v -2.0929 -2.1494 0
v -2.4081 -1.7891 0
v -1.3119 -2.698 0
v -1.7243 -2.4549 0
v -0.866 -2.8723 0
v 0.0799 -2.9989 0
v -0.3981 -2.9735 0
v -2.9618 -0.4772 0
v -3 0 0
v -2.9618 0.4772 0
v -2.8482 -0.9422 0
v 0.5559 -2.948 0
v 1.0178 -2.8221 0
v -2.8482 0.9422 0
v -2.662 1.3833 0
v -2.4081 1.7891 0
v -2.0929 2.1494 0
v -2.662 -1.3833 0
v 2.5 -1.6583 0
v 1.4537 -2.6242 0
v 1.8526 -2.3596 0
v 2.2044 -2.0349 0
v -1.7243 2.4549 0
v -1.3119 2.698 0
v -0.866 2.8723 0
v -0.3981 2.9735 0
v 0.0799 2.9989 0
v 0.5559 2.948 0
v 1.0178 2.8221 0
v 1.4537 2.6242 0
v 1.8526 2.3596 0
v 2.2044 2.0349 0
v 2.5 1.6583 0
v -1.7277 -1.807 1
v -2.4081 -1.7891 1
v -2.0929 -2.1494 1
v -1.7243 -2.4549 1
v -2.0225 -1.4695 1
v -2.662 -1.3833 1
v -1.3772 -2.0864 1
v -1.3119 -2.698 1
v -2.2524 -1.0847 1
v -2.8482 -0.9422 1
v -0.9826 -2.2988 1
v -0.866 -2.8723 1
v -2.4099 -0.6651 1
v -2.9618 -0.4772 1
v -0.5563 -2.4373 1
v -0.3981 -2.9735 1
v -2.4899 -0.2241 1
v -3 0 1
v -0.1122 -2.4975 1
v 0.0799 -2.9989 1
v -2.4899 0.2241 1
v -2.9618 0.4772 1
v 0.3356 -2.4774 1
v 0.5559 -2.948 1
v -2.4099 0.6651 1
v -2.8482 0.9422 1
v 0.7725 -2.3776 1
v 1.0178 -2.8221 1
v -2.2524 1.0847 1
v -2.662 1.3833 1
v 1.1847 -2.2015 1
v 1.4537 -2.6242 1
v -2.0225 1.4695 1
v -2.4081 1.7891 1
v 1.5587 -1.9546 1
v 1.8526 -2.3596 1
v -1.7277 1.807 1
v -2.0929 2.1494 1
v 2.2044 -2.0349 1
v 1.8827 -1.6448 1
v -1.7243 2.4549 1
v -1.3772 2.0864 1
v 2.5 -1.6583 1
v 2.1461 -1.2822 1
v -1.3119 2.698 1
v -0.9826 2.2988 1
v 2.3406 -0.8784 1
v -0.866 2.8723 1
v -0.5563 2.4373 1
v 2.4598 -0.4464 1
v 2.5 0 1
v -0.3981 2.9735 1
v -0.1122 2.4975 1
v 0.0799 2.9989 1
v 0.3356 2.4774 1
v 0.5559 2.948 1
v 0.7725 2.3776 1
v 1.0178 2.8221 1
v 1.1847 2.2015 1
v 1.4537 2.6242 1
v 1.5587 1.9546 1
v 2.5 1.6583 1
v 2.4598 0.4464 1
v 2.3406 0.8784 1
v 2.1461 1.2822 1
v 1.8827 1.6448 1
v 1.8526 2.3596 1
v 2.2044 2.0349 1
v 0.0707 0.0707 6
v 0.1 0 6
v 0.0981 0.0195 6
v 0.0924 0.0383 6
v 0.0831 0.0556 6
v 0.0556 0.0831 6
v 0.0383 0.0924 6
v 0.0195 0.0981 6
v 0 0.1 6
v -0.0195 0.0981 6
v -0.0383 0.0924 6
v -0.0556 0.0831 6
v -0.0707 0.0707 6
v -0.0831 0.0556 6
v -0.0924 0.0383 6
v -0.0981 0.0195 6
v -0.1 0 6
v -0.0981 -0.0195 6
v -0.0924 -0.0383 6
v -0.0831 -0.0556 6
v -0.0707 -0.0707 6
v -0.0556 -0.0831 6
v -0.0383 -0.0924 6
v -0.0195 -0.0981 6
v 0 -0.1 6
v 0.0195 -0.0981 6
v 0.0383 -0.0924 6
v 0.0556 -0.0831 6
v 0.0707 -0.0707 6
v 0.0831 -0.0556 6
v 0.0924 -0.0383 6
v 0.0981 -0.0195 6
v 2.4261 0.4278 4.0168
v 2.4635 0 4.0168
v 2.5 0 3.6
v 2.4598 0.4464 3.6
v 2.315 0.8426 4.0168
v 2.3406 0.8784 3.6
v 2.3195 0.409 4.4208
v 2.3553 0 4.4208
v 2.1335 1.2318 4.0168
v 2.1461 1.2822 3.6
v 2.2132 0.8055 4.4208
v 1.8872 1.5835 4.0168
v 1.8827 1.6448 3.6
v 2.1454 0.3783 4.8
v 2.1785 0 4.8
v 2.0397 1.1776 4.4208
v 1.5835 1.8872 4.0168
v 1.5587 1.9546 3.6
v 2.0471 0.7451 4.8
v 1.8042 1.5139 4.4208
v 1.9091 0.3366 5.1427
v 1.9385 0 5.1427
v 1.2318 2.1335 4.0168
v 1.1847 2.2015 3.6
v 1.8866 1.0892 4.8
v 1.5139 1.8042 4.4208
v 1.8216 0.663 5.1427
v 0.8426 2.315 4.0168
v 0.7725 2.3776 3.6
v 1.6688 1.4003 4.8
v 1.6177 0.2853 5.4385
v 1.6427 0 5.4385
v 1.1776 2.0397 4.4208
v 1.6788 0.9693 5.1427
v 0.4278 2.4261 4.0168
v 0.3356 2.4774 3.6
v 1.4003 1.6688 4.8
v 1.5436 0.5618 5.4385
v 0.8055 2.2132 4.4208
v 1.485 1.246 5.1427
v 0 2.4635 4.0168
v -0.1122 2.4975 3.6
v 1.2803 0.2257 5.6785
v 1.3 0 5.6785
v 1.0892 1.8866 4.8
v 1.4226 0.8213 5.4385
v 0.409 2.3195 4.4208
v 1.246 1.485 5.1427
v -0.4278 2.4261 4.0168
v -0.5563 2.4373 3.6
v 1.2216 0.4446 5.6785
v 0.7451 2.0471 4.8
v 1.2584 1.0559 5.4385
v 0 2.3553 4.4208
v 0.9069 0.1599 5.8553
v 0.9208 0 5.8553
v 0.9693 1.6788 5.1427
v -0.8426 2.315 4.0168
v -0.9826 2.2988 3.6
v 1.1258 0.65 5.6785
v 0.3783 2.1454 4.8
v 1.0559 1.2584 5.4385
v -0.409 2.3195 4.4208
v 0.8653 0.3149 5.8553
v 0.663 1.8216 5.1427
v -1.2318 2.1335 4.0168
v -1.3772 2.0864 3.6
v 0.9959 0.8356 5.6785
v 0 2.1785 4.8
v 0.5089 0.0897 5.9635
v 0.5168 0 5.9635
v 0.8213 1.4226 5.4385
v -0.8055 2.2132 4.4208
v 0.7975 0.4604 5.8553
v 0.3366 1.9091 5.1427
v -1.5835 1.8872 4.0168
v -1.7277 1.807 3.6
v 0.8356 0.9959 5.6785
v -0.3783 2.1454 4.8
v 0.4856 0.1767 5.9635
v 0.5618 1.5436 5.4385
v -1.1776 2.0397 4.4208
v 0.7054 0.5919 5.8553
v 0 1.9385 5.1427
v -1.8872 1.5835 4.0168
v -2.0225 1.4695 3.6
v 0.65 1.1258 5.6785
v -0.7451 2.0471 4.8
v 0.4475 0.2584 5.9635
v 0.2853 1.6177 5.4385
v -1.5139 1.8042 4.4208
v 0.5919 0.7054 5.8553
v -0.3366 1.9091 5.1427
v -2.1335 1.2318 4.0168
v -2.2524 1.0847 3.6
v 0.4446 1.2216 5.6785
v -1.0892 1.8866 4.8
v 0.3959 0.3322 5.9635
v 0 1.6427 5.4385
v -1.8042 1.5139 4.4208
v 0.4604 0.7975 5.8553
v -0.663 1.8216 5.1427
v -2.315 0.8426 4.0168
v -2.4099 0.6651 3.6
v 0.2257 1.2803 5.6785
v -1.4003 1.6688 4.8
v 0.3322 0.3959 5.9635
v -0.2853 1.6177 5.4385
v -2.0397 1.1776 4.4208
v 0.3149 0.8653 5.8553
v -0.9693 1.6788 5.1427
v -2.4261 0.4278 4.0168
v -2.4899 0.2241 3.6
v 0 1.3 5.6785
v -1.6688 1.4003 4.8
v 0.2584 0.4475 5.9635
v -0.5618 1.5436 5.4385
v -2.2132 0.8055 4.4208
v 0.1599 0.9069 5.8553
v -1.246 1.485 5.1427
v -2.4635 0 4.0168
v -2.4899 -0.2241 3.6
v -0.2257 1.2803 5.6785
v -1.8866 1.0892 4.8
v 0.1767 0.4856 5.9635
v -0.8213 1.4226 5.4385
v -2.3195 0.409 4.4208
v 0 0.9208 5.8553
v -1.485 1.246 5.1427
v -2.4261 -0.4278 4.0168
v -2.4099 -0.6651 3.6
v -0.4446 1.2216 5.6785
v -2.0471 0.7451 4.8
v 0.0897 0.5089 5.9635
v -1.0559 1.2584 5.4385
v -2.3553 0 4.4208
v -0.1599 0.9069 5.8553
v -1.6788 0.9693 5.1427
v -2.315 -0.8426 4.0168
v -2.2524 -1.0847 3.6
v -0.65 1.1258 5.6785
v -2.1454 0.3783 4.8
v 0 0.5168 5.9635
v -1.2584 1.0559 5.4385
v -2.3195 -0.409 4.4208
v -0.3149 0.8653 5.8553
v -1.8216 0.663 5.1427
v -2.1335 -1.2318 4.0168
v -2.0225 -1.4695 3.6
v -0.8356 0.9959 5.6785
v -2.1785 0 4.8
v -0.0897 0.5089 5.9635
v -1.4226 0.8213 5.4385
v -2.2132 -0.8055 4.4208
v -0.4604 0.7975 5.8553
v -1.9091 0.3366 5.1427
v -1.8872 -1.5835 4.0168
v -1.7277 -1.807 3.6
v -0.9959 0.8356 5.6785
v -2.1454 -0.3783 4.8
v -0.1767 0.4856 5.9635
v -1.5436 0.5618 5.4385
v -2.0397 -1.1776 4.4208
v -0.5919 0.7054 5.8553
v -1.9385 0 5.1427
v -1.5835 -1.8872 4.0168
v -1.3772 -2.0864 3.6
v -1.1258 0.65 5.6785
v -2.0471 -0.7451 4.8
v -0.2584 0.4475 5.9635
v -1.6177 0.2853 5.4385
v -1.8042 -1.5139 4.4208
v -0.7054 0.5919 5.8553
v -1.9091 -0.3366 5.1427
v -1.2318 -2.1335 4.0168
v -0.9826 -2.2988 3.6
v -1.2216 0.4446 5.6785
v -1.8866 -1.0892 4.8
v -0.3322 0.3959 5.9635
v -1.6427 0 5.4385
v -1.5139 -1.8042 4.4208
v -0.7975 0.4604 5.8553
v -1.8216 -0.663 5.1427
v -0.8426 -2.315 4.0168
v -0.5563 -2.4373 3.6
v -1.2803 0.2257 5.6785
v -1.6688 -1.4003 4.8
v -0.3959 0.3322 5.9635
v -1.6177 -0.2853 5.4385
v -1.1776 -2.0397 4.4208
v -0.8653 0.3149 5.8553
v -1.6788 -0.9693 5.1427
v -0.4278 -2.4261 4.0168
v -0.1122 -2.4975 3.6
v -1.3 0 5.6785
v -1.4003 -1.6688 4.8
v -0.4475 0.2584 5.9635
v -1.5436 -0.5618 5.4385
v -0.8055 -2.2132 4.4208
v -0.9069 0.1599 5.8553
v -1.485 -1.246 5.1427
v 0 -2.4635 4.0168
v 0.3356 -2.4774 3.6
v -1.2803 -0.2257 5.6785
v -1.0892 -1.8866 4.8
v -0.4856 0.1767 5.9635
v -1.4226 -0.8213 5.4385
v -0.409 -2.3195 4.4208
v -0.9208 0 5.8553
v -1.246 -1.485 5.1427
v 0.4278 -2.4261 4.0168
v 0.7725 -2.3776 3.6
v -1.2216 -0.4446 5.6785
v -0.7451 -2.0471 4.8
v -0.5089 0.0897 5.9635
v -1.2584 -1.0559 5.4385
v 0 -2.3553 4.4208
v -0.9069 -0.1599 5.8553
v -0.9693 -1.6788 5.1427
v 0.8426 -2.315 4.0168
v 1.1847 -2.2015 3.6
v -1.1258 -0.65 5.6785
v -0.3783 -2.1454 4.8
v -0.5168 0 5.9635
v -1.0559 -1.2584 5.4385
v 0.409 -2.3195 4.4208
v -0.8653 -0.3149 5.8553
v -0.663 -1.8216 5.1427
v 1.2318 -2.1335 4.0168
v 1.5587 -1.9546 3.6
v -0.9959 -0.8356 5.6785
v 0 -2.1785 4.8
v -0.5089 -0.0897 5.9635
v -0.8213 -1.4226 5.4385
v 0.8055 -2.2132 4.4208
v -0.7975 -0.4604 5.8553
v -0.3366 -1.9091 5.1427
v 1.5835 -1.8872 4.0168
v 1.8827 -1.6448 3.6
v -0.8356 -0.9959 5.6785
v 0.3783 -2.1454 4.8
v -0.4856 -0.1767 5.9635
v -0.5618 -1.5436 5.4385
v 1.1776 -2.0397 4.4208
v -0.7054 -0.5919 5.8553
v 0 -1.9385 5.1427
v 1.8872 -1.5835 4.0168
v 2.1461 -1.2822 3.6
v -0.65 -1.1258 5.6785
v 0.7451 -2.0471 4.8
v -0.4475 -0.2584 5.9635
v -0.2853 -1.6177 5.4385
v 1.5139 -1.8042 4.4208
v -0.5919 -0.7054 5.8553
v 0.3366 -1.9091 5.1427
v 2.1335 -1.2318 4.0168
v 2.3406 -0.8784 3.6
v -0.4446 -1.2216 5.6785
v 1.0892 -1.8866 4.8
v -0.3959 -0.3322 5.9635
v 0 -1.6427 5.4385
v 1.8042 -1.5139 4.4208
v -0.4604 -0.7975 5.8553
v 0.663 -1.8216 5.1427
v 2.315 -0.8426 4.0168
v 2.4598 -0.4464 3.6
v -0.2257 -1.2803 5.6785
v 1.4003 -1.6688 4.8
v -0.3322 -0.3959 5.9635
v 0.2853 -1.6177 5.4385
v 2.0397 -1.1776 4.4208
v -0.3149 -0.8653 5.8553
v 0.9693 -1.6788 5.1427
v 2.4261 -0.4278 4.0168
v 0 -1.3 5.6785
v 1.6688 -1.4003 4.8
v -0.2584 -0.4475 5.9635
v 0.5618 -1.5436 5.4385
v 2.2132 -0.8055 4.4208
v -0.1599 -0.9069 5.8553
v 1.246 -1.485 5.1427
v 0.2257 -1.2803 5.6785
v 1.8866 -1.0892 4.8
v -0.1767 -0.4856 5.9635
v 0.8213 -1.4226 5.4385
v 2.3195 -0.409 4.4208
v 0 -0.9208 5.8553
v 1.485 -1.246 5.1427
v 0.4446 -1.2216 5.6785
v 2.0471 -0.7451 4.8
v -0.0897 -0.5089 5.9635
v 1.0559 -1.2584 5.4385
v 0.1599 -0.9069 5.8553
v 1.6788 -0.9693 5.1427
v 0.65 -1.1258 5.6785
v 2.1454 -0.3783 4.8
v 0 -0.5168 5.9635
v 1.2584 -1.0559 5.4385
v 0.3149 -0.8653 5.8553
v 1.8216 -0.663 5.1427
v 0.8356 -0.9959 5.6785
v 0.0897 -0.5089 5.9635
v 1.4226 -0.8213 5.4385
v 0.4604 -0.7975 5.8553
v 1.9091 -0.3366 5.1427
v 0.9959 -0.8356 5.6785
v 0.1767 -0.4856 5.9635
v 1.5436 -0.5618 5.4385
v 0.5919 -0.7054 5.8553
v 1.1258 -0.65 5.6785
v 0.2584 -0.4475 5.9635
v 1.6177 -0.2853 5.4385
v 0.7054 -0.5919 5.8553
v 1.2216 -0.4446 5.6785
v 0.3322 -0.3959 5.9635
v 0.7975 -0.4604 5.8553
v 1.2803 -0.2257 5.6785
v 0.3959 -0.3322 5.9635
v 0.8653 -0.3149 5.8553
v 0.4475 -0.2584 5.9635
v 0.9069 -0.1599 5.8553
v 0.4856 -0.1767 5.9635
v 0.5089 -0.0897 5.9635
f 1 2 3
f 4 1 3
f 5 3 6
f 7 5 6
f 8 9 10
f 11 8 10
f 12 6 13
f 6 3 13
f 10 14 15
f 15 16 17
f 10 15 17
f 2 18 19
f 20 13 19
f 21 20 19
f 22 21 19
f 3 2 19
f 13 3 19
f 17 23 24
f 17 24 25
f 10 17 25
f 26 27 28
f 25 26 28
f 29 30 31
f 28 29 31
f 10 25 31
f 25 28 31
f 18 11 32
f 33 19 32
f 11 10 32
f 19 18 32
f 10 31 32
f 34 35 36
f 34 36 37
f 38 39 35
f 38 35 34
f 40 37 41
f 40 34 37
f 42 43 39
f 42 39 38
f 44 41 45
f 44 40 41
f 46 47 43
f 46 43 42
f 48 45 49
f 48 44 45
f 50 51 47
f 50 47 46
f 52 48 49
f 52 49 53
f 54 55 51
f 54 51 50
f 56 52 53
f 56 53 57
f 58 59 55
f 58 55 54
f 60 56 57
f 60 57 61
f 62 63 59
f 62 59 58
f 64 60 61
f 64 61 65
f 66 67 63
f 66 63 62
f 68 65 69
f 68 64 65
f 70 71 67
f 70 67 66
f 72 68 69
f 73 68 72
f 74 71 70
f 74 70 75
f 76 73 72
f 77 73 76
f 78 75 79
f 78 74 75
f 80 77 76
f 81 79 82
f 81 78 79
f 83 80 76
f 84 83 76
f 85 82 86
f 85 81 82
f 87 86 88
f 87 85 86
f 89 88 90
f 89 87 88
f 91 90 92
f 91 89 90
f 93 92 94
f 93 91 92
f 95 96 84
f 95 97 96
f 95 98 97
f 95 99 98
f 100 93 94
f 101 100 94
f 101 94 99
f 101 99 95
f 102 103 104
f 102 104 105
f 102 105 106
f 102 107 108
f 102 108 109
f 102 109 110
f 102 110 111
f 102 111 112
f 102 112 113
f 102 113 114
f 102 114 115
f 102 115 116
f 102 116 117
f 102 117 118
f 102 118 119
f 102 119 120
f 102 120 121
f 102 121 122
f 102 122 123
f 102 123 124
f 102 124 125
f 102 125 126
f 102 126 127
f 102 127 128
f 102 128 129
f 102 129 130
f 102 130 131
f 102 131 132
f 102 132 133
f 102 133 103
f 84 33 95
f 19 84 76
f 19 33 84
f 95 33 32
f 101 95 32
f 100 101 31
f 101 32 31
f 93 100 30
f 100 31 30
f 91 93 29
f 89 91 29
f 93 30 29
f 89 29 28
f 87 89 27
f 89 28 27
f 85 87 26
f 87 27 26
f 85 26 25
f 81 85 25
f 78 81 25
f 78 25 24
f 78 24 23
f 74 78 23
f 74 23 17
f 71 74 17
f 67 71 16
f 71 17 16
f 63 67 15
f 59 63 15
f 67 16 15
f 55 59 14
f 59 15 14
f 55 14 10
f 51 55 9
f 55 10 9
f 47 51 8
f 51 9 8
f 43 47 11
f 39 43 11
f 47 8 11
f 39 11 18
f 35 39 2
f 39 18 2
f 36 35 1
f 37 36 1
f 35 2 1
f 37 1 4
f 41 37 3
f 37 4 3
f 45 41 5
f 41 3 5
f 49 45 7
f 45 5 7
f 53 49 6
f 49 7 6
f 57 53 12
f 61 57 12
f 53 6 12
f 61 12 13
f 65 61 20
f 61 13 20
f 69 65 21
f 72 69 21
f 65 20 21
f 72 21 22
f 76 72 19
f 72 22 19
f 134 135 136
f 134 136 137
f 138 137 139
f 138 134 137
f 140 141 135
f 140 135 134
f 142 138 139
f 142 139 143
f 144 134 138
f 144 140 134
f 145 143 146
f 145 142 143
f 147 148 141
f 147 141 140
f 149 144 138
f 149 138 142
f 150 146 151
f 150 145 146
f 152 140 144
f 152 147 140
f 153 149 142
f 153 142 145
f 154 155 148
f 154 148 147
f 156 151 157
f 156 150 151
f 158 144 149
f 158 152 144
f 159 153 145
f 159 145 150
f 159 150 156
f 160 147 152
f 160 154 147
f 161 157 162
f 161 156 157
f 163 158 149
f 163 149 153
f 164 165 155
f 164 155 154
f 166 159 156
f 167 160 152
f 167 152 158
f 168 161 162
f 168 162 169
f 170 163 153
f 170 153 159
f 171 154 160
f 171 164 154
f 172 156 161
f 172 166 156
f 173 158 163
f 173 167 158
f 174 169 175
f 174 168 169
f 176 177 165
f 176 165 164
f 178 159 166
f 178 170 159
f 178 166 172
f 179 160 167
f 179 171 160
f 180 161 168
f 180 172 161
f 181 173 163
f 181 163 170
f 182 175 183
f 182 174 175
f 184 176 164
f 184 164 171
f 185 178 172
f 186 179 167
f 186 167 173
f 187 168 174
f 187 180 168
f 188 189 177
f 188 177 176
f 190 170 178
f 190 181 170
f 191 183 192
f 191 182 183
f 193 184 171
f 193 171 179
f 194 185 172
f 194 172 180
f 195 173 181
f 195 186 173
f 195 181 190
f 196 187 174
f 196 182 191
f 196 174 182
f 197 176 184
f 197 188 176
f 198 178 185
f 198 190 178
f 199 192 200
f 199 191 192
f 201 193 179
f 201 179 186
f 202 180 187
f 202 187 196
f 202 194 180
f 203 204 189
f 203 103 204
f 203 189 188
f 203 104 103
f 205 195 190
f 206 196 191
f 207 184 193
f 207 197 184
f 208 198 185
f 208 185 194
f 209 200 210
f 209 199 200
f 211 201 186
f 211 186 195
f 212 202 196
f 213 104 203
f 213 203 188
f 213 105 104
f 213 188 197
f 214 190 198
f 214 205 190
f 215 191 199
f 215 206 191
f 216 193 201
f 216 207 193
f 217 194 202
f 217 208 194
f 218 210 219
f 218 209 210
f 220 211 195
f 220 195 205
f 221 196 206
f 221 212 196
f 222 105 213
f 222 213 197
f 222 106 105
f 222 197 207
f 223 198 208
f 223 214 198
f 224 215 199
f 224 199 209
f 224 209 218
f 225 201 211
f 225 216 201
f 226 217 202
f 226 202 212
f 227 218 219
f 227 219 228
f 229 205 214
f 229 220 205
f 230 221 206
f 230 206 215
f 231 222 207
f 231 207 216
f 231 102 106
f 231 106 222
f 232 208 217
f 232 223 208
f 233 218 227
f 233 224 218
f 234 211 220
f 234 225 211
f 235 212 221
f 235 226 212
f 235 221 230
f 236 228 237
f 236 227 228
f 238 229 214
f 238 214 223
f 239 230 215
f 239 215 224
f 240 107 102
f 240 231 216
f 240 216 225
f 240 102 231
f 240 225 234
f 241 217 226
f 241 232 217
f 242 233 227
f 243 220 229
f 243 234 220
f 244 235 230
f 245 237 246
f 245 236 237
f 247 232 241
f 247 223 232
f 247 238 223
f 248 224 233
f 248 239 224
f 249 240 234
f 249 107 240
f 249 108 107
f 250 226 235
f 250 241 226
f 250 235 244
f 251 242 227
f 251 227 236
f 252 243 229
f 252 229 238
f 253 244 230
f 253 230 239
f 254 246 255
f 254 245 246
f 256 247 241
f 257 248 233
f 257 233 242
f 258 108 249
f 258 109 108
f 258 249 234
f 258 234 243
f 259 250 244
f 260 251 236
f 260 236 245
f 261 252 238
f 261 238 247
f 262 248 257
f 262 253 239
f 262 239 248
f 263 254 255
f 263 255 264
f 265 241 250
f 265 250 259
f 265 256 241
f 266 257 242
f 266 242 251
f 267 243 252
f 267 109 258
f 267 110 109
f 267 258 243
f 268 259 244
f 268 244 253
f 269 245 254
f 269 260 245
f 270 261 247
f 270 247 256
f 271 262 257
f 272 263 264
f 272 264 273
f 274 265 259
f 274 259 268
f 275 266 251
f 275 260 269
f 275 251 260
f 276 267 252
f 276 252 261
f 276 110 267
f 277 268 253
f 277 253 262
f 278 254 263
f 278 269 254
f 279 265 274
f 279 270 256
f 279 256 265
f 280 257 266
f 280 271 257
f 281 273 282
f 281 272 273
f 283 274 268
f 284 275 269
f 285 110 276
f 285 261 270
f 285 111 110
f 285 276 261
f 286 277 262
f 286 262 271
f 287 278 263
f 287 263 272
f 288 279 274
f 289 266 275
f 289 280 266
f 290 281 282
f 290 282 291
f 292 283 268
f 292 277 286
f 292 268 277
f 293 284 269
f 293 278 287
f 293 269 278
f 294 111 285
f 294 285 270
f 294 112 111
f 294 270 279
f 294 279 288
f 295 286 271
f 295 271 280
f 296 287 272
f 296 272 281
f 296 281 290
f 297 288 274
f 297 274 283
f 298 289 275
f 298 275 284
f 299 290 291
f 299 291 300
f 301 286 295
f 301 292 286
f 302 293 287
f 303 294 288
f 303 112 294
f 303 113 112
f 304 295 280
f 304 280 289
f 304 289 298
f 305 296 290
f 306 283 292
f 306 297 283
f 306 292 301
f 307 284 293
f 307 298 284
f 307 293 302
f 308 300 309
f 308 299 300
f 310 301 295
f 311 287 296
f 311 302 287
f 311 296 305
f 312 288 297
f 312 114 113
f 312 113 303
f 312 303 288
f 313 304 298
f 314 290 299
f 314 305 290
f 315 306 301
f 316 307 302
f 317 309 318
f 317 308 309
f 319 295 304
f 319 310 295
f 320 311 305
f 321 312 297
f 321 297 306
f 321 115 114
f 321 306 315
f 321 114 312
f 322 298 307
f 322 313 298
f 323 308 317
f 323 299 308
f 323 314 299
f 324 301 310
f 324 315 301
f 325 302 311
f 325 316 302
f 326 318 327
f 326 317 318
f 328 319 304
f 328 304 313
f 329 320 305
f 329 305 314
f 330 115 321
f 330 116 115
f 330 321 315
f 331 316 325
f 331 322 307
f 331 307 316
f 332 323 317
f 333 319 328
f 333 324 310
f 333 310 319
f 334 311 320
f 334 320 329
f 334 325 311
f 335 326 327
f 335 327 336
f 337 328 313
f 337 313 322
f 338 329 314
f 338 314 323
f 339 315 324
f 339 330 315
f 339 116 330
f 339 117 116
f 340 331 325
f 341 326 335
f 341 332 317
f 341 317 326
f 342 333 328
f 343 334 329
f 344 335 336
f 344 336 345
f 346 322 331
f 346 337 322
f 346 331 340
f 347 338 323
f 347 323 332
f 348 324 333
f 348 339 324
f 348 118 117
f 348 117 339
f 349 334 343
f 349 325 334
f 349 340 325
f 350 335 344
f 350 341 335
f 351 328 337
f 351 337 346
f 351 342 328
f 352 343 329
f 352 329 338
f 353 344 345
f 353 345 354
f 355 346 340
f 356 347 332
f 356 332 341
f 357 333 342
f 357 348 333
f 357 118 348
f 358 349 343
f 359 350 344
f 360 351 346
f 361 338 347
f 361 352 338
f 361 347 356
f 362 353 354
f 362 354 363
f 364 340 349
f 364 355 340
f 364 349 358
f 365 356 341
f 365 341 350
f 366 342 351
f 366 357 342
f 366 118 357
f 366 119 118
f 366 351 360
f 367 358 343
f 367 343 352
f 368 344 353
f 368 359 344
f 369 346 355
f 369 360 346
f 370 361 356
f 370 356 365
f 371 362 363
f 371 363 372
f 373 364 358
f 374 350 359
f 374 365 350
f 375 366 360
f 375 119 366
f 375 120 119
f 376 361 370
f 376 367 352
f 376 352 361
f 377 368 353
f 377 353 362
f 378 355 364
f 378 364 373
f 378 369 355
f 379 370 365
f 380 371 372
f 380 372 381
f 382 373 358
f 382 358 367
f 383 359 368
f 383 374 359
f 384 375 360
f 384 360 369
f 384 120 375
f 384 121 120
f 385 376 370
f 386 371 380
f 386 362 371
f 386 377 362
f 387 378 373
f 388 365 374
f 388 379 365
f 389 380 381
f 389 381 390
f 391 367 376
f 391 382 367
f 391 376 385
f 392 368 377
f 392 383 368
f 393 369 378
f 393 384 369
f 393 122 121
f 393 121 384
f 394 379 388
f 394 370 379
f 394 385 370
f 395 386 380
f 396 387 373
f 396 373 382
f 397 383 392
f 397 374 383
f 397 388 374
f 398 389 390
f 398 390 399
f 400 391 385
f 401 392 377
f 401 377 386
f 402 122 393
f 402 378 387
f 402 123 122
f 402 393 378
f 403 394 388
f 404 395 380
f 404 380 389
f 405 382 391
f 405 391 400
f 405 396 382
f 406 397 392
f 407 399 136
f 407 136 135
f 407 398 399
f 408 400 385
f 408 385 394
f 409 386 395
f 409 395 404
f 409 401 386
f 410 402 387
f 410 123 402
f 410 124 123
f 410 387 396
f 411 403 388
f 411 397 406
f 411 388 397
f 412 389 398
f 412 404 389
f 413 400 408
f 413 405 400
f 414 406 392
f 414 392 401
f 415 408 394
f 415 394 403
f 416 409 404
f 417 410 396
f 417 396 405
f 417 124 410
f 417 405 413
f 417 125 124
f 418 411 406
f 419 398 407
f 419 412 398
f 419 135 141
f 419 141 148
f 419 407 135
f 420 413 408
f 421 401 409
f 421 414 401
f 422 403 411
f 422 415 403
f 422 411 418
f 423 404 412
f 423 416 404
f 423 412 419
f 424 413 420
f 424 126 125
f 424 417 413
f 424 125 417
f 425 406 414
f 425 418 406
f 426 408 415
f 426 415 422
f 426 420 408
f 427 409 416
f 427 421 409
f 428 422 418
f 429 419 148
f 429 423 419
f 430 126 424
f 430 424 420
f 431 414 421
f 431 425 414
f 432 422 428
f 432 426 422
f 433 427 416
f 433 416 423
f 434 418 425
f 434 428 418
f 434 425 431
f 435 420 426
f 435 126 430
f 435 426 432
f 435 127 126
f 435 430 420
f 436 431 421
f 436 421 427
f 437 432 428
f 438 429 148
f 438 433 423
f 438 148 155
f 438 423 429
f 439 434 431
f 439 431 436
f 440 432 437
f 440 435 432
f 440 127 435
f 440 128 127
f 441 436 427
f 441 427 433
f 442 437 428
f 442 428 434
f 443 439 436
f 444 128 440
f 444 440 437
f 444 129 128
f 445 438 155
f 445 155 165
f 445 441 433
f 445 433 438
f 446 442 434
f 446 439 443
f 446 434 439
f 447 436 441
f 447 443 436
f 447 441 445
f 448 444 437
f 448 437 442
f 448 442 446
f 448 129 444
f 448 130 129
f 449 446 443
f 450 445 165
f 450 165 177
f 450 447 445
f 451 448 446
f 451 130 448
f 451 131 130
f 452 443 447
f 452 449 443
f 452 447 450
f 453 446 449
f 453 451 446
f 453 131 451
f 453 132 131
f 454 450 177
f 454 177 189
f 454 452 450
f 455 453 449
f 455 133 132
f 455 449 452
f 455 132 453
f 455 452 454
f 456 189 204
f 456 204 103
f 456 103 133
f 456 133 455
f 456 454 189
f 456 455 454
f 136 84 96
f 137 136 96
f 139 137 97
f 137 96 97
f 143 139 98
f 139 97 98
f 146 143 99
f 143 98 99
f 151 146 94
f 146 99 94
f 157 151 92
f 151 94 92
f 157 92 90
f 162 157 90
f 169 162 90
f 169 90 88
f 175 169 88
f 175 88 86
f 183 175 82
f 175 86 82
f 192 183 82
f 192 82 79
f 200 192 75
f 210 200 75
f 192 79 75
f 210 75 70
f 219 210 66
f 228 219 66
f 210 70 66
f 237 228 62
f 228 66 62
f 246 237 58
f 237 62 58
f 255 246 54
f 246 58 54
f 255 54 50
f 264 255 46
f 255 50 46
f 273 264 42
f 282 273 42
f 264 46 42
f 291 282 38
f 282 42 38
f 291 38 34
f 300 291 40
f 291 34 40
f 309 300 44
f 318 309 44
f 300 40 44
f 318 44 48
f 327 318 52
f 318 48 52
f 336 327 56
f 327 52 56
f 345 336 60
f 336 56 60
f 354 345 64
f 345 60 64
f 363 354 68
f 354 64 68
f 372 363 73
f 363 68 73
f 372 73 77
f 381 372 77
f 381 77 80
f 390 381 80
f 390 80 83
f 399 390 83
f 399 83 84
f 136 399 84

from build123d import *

# Parameters (mm, degrees)
EXTRUDE_SKETCH001_DEPTH = 1
SKETCH002_R             = 2.5
EXTRUDE_SKETCH002_DEPTH = 5
FILLET_R                = 2.4


with BuildPart() as sketch001_extrude:
    # Sketch001 → Extrude_Sketch001 (new body)
    with BuildSketch(Plane.XY):
        with BuildLine():
            ThreePointArc((2.5, 1.658312), (-3, 0), (2.5, -1.658312))
            Line((2.5, 1.658312), (2.5, -1.658312))
        make_face()
    extrude(amount=EXTRUDE_SKETCH001_DEPTH)


with BuildPart() as fusion:
    # Sketch002 → Extrude_Sketch002 (new body)
    with BuildSketch(Plane.XY.offset(1)):
        Circle(SKETCH002_R)
    extrude(amount=EXTRUDE_SKETCH002_DEPTH)

    # Fillet
    fillet_edges = [fusion.edges().sort_by_distance(p)[0] for p in [
        (-2.5, 0, 6),
    ]]
    fillet(fillet_edges, radius=FILLET_R)

    # Fusion: union Sketch001_Extrude
    add(sketch001_extrude.part)


solid = fusion.part
